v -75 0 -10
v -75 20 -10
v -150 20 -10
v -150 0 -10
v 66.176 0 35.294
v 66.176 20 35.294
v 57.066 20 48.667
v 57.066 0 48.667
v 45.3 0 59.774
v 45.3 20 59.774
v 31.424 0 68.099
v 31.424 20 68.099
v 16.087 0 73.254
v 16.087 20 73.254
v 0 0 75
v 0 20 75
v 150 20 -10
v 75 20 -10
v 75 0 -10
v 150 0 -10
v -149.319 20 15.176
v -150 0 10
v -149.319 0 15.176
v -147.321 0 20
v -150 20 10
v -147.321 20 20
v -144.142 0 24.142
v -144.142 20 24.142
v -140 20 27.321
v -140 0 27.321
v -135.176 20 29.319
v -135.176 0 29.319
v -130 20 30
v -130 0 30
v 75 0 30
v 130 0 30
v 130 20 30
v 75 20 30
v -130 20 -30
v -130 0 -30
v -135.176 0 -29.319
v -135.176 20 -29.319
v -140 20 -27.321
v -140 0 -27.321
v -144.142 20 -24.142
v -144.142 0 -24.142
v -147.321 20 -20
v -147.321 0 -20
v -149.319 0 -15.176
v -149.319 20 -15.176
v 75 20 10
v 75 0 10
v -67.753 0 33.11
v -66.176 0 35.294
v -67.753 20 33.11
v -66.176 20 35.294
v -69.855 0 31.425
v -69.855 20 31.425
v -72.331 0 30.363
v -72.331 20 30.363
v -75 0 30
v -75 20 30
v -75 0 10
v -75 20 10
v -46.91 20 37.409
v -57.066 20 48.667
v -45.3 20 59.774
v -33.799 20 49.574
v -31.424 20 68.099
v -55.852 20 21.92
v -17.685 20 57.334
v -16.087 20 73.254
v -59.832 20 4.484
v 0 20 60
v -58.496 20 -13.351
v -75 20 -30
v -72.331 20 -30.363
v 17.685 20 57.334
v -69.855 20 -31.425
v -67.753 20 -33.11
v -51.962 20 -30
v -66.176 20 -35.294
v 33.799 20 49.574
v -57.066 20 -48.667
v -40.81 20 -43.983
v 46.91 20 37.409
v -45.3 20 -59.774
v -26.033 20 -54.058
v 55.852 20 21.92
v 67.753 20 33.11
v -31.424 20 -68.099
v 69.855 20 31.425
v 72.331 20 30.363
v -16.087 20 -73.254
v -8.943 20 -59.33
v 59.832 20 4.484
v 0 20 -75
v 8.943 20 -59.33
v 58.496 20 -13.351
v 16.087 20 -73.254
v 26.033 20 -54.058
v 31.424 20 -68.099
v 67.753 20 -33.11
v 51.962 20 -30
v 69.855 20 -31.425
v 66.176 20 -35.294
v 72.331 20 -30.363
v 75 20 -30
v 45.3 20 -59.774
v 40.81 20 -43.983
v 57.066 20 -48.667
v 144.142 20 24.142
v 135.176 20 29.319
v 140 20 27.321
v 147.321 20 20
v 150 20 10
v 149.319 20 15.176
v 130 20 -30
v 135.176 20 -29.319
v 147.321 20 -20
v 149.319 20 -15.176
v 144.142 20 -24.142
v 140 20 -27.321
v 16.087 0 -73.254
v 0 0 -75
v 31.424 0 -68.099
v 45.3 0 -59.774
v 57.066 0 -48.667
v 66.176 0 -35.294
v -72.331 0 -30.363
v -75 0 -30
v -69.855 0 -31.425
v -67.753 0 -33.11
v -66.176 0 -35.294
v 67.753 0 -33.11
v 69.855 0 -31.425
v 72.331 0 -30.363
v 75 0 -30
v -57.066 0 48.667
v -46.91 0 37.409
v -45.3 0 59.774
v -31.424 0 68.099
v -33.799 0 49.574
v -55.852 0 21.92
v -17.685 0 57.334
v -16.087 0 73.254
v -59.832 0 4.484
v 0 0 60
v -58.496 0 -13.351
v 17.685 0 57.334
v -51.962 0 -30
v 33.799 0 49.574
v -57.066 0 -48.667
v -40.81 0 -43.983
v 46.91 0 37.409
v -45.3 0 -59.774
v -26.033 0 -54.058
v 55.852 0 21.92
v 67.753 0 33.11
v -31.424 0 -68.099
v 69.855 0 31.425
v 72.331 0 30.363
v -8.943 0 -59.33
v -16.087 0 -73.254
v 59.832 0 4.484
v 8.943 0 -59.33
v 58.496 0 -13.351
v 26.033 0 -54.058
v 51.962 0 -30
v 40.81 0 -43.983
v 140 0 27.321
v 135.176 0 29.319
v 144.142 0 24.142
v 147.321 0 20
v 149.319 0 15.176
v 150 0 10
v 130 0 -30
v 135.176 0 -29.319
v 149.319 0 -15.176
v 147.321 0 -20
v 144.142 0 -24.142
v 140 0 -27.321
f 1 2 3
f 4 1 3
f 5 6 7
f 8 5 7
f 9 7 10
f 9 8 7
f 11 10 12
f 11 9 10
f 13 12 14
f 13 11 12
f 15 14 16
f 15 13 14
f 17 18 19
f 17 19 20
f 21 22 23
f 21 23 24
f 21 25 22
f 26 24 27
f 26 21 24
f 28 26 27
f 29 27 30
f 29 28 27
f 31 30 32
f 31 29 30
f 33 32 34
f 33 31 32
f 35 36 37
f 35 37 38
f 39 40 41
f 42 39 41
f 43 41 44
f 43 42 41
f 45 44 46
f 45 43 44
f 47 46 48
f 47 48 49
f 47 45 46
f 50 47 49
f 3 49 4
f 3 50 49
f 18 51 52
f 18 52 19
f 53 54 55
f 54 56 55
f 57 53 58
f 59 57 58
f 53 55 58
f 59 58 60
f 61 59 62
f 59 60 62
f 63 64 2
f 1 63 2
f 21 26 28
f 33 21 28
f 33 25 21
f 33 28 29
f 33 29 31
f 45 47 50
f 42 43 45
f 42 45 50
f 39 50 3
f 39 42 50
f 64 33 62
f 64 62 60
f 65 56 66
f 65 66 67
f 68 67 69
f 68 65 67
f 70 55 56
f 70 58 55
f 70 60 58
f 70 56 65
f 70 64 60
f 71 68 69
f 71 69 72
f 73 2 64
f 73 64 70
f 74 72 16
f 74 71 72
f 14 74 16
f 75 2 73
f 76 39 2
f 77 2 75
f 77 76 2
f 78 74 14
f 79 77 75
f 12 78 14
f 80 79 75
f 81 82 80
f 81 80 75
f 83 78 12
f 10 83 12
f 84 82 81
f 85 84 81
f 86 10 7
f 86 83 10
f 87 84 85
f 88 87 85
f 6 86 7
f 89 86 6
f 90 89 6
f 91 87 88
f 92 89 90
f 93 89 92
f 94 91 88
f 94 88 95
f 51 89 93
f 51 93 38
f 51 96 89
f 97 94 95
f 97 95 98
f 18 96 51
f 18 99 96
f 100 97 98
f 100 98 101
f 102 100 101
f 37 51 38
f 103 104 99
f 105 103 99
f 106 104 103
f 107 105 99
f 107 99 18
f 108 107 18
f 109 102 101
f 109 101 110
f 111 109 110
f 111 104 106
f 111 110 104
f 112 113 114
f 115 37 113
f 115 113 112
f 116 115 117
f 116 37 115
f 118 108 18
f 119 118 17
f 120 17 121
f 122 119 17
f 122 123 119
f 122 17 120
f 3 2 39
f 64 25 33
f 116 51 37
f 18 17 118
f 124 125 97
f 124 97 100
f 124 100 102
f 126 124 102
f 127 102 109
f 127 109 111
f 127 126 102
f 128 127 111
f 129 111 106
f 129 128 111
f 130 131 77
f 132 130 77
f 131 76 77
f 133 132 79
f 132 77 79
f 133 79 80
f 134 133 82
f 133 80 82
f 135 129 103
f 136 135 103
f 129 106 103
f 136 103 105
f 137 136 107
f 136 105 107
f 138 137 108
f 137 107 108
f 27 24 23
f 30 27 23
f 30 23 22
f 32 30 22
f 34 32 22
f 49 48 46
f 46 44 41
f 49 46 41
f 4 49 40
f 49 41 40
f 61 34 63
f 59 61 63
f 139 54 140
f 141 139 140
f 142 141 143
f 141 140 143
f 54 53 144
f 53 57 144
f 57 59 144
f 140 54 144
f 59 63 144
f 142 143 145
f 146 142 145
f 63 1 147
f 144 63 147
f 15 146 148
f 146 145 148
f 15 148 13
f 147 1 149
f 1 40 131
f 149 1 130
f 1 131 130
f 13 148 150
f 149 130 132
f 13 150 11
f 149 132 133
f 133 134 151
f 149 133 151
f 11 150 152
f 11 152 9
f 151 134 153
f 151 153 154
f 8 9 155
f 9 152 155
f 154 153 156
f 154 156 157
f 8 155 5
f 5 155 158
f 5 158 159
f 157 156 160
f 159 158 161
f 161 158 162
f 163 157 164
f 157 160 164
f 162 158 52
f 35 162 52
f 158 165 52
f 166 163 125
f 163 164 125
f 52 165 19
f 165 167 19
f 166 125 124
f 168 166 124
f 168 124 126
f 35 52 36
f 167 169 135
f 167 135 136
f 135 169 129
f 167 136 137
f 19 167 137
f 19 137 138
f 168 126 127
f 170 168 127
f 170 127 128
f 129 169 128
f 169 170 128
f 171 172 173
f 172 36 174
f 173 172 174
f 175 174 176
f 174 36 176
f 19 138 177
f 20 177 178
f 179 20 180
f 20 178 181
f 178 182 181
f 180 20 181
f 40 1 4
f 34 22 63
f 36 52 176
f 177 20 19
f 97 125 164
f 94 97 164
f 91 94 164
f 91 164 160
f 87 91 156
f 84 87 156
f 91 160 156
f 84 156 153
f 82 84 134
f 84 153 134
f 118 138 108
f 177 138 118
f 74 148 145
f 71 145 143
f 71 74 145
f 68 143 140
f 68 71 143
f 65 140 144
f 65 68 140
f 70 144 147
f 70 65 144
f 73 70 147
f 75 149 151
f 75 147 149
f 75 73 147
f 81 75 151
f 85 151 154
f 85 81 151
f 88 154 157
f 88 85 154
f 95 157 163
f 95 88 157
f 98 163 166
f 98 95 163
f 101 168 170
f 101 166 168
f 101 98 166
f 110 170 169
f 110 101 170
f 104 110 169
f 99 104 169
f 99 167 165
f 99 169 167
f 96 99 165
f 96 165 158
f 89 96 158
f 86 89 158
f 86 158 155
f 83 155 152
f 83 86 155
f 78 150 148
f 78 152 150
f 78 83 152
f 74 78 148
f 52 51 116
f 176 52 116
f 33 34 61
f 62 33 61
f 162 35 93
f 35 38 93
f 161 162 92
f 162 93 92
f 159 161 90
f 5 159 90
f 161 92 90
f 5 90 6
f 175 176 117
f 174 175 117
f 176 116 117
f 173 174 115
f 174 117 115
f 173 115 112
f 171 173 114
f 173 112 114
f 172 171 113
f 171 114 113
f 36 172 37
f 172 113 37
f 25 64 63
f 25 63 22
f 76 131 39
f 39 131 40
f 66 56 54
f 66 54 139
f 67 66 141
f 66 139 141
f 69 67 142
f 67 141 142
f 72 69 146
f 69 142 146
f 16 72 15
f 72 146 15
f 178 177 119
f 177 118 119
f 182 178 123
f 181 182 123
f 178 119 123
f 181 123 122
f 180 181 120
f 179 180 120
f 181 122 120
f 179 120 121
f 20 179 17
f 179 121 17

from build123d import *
from build123d.topology import SkipClean

# Parameters (mm, degrees)
BOSS_EXTRUDE1_DEPTH = 20
SKETCH2_W           = 75
SKETCH2_H           = 20
CUT_EXTRUDE1_DEPTH  = 20
FILLET1_R           = 10
FILLET2_R           = 20


with BuildPart() as part:
    # Sketch1 → Boss-Extrude1 (new body)
    with BuildSketch(Plane(origin=(0, 0, 0), x_dir=(1, 0, 0), z_dir=(0, 1, 0))):
        with BuildLine():
            Line((68.738635424, 30), (150, 30))
            Line((150, 30), (150, -30))
            Line((150, -30), (68.738635424, -30))
            ThreePointArc((68.738635424, -30), (41.079191813, -62.74950199), (0, -75))
            Line((0, -75), (0, 75))
            ThreePointArc((0, 75), (41.079191813, 62.74950199), (68.738635424, 30))
        make_face()
    boss_extrude1 = extrude(amount=BOSS_EXTRUDE1_DEPTH)

    # Sketch2 → Cut-Extrude1 (cut)
    with BuildSketch(Plane(origin=(0, 20, 0), x_dir=(1, 0, 0), z_dir=(0, 1, 0))):
        with BuildLine():
            Line((0, 60), (0, -60))
            ThreePointArc((0, -60), (60, 0), (0, 60))
        make_face()
        with Locations((112.5, 0)):
            Rectangle(SKETCH2_W, SKETCH2_H)
    cut_extrude1 = extrude(amount=-CUT_EXTRUDE1_DEPTH, mode=Mode.SUBTRACT)

    # Mirror1: Boss-Extrude1, Cut-Extrude1 across plane
    with SkipClean():  # the faces are left unmerged after this step: merging them gives an invalid solid
        add(boss_extrude1.mirror(Plane(origin=(0, 0, 0), x_dir=(0, 0, 1), z_dir=(1, 0, 0))))
        add(cut_extrude1.mirror(Plane(origin=(0, 0, 0), x_dir=(0, 0, 1), z_dir=(1, 0, 0))), mode=Mode.SUBTRACT)
    add(part.part.scale(1), mode=Mode.REPLACE)  # the faces are merged on a copy

    # Fillet1
    fillet1_edges = [part.edges().sort_by_distance(p)[0] for p in [
        (68.738635424, 10, -30),
        (68.738635424, 10, 30),
        (-68.738635424, 10, -30),
        (-68.738635424, 10, 30),
    ]]
    fillet(fillet1_edges, radius=FILLET1_R)

    # Fillet2
    fillet2_edges = [part.edges().sort_by_distance(p)[0] for p in [
        (-150, 10, 30),
        (-150, 10, -30),
        (150, 10, -30),
        (150, 10, 30),
    ]]
    fillet(fillet2_edges, radius=FILLET2_R - 0.0001)  # a hair under: the kernel refuses the full size


solid = part.part
